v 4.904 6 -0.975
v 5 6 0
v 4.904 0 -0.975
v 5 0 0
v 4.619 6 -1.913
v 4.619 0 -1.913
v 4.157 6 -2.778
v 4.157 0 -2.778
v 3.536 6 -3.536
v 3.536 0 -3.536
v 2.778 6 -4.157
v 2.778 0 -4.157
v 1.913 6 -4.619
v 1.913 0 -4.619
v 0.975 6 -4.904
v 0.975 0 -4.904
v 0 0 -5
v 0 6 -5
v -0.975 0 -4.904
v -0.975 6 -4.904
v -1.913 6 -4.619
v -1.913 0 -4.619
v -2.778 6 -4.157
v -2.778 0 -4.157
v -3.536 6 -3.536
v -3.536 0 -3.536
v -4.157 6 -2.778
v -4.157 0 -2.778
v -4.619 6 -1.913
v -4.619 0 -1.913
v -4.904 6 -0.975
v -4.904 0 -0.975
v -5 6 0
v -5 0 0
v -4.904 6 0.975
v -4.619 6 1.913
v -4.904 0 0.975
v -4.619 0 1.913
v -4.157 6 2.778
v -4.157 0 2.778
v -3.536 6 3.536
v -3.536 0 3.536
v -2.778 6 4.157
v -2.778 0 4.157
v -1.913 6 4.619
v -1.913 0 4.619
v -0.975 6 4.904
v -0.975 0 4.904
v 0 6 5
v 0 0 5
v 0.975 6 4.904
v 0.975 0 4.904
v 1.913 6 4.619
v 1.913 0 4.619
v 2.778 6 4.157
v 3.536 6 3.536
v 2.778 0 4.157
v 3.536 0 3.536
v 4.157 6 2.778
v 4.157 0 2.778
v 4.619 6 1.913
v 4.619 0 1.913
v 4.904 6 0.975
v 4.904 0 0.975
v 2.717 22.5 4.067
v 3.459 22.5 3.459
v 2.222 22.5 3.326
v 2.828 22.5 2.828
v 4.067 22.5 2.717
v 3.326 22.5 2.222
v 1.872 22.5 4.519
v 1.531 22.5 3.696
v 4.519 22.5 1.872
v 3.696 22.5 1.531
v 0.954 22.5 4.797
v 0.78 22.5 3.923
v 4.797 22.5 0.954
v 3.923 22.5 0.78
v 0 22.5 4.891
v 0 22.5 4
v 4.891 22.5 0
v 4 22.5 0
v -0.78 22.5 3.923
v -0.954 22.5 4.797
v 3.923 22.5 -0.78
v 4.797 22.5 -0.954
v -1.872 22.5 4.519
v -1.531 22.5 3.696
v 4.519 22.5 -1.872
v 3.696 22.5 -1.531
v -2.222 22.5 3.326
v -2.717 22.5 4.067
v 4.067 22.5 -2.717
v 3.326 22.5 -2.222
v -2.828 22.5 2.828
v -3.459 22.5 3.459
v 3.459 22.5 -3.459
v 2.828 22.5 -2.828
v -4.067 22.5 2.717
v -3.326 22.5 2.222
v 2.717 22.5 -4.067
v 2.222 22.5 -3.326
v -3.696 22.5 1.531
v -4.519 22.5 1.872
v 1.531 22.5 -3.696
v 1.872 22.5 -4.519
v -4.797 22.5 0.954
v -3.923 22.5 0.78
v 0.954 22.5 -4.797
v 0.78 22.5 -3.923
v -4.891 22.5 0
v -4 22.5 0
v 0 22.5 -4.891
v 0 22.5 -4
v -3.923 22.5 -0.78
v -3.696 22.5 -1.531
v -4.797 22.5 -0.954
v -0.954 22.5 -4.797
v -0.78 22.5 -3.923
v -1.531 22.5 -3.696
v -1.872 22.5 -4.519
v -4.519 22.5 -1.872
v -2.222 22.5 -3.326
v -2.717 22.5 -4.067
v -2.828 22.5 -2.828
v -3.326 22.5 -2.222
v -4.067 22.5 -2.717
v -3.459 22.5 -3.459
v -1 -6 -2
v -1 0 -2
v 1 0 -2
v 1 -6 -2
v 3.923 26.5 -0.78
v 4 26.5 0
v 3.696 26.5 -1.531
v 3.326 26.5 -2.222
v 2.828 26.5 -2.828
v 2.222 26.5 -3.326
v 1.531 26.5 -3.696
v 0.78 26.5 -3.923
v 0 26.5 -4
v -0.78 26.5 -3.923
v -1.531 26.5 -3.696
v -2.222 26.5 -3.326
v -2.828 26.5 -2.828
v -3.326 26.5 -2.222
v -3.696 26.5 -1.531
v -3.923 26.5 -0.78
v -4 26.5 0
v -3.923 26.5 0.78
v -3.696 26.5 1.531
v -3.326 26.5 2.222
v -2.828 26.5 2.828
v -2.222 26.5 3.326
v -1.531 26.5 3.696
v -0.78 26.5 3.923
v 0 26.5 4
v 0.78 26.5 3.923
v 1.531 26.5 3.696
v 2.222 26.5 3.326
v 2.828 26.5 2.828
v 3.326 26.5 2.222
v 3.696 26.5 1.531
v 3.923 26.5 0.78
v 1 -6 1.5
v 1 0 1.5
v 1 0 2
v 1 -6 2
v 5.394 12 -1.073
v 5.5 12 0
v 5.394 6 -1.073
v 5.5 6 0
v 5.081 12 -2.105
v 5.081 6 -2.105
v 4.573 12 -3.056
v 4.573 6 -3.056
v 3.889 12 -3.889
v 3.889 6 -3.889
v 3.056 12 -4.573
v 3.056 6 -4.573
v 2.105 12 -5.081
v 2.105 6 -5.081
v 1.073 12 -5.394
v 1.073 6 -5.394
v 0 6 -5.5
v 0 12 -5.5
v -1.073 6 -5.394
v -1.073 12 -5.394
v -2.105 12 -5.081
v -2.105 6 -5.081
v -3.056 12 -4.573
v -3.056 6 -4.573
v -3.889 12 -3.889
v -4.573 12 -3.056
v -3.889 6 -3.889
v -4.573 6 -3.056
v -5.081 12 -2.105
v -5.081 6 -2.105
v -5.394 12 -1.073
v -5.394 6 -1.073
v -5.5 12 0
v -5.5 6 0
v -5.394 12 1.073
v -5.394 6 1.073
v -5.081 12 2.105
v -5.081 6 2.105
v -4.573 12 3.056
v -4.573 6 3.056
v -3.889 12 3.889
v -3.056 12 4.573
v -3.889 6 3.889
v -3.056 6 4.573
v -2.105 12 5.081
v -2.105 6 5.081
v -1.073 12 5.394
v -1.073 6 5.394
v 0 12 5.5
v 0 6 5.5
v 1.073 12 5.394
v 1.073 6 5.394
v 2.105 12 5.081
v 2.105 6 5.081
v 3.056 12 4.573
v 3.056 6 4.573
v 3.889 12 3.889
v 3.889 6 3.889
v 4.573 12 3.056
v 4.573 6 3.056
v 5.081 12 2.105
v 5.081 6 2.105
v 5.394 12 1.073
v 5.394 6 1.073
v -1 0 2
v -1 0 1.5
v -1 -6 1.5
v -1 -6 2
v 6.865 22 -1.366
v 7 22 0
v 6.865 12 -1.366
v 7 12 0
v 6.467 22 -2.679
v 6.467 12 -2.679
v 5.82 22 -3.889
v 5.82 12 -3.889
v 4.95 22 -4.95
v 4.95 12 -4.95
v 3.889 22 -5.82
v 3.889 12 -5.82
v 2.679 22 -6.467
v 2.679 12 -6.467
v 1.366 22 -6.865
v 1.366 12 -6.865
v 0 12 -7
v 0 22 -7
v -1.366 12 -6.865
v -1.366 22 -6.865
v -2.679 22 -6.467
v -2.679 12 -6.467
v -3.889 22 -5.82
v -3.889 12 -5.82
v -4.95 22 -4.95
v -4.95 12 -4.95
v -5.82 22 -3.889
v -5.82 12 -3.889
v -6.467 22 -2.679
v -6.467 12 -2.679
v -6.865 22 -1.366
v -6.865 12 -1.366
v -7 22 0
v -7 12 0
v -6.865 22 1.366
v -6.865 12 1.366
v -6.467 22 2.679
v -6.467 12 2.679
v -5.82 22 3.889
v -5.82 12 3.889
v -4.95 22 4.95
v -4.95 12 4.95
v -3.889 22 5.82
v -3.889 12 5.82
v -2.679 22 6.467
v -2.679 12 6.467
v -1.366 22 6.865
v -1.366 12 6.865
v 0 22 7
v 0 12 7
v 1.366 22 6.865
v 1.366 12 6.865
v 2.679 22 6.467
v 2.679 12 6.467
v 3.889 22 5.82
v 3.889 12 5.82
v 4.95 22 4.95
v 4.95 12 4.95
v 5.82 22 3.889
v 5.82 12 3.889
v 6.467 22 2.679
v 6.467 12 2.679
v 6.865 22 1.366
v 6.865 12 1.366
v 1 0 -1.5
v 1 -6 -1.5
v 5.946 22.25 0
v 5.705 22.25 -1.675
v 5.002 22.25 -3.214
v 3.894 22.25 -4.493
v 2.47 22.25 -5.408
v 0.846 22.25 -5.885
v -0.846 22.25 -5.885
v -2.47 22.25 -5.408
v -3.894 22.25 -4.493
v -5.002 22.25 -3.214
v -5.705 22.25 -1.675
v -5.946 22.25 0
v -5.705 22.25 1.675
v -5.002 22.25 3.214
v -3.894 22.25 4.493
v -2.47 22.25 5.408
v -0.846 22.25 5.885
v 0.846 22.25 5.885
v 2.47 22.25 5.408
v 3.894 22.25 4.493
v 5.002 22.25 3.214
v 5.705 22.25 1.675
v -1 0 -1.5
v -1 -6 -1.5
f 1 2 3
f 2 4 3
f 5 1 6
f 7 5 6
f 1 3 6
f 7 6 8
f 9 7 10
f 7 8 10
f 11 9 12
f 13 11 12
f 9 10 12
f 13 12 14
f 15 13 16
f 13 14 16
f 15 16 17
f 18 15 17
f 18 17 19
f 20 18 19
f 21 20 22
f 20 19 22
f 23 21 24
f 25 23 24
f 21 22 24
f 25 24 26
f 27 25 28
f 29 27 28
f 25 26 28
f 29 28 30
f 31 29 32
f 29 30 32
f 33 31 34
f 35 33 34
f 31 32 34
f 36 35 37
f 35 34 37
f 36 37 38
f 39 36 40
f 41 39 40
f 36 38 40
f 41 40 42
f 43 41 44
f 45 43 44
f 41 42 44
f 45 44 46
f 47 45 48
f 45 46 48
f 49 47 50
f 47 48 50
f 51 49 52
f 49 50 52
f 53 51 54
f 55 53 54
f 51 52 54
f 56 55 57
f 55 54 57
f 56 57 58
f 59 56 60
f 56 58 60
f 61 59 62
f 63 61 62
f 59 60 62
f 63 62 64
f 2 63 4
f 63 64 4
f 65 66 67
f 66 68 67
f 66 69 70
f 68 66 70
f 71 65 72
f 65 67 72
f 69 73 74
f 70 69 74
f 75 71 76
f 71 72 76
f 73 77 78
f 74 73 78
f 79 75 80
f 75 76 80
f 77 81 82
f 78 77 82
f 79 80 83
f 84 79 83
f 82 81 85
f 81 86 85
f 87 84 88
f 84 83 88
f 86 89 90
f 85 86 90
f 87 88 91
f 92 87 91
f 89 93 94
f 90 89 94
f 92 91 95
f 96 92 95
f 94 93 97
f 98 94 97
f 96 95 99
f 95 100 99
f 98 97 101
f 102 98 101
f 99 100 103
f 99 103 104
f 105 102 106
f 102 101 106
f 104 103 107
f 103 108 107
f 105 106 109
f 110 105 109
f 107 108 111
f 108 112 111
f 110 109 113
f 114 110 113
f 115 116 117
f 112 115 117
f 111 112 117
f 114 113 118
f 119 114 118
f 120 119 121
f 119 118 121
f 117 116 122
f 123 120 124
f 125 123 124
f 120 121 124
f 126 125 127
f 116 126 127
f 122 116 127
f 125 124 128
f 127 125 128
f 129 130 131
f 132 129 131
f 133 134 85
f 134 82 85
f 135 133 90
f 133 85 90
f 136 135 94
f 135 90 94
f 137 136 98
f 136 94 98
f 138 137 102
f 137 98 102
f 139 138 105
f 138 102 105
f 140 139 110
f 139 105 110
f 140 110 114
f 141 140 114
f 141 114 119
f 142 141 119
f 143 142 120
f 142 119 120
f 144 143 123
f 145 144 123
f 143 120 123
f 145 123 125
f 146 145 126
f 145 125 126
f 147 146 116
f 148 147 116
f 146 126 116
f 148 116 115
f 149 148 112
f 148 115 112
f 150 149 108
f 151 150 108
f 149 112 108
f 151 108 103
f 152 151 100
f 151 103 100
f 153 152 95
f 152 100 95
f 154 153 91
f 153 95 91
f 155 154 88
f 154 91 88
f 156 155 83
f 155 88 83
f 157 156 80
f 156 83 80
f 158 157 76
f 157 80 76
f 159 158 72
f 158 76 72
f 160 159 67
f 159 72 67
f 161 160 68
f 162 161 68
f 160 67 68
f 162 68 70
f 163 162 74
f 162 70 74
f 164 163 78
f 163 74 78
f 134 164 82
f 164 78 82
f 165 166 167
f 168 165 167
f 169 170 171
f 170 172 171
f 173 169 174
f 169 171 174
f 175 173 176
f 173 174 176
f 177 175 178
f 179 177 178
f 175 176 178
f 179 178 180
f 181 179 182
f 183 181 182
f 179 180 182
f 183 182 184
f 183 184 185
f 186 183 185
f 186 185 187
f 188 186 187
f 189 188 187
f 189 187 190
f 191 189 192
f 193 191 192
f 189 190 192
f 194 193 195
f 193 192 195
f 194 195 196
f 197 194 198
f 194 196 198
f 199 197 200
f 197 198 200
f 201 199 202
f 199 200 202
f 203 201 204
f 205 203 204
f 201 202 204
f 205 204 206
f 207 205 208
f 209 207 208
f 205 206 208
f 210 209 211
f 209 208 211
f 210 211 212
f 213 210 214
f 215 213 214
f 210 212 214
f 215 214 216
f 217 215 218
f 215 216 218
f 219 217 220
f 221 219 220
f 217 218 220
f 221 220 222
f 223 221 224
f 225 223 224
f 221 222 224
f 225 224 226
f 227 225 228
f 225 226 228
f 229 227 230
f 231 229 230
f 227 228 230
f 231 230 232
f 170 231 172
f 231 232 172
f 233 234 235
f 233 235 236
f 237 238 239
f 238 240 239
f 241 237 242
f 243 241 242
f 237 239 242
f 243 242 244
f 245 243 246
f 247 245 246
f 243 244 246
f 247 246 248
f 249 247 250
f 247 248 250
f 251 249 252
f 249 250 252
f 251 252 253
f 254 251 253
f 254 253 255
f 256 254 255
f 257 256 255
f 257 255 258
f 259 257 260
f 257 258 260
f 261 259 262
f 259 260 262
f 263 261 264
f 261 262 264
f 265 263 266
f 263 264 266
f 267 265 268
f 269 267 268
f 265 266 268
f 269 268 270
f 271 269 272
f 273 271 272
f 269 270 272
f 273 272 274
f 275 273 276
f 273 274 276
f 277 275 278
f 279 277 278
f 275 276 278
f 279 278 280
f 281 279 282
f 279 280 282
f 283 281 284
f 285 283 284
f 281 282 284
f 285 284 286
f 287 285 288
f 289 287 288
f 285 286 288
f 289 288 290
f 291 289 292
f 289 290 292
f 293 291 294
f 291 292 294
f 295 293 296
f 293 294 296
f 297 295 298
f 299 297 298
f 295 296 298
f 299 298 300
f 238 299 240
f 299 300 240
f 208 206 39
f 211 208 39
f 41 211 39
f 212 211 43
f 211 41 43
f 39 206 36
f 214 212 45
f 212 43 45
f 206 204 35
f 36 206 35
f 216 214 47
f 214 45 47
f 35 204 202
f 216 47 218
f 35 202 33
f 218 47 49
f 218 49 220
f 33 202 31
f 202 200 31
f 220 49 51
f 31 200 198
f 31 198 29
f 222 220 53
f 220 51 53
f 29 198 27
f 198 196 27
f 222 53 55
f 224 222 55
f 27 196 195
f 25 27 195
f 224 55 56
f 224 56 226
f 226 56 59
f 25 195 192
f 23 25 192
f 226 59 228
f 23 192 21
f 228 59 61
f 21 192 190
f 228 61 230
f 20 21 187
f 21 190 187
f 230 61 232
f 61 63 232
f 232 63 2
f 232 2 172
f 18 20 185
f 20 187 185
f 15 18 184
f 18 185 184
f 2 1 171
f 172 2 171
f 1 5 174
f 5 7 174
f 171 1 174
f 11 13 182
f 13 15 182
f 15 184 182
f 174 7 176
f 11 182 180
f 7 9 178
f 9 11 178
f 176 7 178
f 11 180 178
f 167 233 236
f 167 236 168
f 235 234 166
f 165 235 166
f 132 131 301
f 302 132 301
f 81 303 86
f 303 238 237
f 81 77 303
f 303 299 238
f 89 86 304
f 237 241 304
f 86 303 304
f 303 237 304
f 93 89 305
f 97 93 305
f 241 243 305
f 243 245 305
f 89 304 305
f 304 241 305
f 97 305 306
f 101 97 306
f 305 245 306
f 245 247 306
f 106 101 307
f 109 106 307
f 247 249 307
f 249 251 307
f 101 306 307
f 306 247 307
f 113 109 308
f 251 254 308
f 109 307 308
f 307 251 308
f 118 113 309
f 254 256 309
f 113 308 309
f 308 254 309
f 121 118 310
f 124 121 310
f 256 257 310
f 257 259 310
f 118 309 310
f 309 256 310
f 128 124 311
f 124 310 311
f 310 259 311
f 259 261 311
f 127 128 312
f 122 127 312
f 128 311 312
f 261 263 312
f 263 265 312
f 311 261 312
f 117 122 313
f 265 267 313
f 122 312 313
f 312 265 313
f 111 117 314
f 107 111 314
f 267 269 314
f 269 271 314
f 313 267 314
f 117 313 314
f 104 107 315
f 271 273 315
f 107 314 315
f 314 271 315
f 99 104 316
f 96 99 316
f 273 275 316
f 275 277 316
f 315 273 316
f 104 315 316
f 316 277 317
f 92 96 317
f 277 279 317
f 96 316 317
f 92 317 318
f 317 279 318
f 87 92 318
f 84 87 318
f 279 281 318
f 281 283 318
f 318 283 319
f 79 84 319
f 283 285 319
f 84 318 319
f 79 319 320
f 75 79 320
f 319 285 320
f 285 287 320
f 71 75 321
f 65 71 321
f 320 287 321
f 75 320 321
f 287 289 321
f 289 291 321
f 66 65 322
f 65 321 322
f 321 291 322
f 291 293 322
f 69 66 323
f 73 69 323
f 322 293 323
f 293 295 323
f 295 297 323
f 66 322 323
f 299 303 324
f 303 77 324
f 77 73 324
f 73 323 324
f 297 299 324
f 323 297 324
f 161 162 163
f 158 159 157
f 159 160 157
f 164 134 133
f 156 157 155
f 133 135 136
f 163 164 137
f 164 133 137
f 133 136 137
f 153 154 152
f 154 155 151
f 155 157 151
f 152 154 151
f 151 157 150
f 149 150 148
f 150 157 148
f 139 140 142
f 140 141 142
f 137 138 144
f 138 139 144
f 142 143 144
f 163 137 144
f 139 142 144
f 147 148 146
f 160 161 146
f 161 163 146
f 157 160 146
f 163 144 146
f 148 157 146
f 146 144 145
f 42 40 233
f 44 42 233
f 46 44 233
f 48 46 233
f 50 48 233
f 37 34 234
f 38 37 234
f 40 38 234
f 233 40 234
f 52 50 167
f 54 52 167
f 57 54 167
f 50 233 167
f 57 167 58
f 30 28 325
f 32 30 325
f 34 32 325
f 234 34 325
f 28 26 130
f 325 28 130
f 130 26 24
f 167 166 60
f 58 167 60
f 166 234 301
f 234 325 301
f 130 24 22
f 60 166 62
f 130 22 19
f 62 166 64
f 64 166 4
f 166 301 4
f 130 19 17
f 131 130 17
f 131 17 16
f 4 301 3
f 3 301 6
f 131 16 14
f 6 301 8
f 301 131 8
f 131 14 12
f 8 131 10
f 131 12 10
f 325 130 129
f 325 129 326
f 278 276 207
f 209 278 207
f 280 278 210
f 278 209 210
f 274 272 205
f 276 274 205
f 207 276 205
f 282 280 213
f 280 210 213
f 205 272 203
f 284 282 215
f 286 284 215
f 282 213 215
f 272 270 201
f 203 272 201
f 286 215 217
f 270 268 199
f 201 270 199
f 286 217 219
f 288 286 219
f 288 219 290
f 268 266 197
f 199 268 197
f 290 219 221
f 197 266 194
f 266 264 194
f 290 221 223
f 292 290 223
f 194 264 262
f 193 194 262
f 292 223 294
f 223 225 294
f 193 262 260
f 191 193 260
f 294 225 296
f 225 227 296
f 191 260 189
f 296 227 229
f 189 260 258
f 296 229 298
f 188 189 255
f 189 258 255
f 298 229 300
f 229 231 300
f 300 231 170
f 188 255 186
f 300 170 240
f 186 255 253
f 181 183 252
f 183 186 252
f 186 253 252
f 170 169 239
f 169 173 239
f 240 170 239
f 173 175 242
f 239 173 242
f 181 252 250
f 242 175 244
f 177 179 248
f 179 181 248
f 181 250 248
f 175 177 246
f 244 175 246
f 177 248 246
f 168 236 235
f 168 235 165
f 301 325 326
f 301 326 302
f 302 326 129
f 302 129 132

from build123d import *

# Parameters (mm, degrees)
ESBO_O2_W                = 2
ESBO_O2_H                = 0.5
RESSALTO_EXTRUS_O1_DEPTH = 6


with BuildPart() as part:
    # Esboço1 → Revolução1 (revolve)
    with BuildSketch(Plane.XY):
        Polygon((0, 26.5), (4, 26.5), (4, 22.5), (4.891304348, 22.5), (7, 22), (7, 12), (5.5, 12), (5.5, 6), (5, 6), (5, 0), (0, 0), align=None)
    revolve(axis=Axis((0, 0, 0), (0, 1, 0)))

    # Esboço2 → Ressalto-extrusão1 (add)
    with BuildSketch(Plane.XZ):
        with Locations((0, -1.75)):
            Rectangle(ESBO_O2_W, ESBO_O2_H)
        with Locations((0, 1.75)):
            Rectangle(ESBO_O2_W, ESBO_O2_H)
    extrude(amount=RESSALTO_EXTRUS_O1_DEPTH)


solid = part.part
